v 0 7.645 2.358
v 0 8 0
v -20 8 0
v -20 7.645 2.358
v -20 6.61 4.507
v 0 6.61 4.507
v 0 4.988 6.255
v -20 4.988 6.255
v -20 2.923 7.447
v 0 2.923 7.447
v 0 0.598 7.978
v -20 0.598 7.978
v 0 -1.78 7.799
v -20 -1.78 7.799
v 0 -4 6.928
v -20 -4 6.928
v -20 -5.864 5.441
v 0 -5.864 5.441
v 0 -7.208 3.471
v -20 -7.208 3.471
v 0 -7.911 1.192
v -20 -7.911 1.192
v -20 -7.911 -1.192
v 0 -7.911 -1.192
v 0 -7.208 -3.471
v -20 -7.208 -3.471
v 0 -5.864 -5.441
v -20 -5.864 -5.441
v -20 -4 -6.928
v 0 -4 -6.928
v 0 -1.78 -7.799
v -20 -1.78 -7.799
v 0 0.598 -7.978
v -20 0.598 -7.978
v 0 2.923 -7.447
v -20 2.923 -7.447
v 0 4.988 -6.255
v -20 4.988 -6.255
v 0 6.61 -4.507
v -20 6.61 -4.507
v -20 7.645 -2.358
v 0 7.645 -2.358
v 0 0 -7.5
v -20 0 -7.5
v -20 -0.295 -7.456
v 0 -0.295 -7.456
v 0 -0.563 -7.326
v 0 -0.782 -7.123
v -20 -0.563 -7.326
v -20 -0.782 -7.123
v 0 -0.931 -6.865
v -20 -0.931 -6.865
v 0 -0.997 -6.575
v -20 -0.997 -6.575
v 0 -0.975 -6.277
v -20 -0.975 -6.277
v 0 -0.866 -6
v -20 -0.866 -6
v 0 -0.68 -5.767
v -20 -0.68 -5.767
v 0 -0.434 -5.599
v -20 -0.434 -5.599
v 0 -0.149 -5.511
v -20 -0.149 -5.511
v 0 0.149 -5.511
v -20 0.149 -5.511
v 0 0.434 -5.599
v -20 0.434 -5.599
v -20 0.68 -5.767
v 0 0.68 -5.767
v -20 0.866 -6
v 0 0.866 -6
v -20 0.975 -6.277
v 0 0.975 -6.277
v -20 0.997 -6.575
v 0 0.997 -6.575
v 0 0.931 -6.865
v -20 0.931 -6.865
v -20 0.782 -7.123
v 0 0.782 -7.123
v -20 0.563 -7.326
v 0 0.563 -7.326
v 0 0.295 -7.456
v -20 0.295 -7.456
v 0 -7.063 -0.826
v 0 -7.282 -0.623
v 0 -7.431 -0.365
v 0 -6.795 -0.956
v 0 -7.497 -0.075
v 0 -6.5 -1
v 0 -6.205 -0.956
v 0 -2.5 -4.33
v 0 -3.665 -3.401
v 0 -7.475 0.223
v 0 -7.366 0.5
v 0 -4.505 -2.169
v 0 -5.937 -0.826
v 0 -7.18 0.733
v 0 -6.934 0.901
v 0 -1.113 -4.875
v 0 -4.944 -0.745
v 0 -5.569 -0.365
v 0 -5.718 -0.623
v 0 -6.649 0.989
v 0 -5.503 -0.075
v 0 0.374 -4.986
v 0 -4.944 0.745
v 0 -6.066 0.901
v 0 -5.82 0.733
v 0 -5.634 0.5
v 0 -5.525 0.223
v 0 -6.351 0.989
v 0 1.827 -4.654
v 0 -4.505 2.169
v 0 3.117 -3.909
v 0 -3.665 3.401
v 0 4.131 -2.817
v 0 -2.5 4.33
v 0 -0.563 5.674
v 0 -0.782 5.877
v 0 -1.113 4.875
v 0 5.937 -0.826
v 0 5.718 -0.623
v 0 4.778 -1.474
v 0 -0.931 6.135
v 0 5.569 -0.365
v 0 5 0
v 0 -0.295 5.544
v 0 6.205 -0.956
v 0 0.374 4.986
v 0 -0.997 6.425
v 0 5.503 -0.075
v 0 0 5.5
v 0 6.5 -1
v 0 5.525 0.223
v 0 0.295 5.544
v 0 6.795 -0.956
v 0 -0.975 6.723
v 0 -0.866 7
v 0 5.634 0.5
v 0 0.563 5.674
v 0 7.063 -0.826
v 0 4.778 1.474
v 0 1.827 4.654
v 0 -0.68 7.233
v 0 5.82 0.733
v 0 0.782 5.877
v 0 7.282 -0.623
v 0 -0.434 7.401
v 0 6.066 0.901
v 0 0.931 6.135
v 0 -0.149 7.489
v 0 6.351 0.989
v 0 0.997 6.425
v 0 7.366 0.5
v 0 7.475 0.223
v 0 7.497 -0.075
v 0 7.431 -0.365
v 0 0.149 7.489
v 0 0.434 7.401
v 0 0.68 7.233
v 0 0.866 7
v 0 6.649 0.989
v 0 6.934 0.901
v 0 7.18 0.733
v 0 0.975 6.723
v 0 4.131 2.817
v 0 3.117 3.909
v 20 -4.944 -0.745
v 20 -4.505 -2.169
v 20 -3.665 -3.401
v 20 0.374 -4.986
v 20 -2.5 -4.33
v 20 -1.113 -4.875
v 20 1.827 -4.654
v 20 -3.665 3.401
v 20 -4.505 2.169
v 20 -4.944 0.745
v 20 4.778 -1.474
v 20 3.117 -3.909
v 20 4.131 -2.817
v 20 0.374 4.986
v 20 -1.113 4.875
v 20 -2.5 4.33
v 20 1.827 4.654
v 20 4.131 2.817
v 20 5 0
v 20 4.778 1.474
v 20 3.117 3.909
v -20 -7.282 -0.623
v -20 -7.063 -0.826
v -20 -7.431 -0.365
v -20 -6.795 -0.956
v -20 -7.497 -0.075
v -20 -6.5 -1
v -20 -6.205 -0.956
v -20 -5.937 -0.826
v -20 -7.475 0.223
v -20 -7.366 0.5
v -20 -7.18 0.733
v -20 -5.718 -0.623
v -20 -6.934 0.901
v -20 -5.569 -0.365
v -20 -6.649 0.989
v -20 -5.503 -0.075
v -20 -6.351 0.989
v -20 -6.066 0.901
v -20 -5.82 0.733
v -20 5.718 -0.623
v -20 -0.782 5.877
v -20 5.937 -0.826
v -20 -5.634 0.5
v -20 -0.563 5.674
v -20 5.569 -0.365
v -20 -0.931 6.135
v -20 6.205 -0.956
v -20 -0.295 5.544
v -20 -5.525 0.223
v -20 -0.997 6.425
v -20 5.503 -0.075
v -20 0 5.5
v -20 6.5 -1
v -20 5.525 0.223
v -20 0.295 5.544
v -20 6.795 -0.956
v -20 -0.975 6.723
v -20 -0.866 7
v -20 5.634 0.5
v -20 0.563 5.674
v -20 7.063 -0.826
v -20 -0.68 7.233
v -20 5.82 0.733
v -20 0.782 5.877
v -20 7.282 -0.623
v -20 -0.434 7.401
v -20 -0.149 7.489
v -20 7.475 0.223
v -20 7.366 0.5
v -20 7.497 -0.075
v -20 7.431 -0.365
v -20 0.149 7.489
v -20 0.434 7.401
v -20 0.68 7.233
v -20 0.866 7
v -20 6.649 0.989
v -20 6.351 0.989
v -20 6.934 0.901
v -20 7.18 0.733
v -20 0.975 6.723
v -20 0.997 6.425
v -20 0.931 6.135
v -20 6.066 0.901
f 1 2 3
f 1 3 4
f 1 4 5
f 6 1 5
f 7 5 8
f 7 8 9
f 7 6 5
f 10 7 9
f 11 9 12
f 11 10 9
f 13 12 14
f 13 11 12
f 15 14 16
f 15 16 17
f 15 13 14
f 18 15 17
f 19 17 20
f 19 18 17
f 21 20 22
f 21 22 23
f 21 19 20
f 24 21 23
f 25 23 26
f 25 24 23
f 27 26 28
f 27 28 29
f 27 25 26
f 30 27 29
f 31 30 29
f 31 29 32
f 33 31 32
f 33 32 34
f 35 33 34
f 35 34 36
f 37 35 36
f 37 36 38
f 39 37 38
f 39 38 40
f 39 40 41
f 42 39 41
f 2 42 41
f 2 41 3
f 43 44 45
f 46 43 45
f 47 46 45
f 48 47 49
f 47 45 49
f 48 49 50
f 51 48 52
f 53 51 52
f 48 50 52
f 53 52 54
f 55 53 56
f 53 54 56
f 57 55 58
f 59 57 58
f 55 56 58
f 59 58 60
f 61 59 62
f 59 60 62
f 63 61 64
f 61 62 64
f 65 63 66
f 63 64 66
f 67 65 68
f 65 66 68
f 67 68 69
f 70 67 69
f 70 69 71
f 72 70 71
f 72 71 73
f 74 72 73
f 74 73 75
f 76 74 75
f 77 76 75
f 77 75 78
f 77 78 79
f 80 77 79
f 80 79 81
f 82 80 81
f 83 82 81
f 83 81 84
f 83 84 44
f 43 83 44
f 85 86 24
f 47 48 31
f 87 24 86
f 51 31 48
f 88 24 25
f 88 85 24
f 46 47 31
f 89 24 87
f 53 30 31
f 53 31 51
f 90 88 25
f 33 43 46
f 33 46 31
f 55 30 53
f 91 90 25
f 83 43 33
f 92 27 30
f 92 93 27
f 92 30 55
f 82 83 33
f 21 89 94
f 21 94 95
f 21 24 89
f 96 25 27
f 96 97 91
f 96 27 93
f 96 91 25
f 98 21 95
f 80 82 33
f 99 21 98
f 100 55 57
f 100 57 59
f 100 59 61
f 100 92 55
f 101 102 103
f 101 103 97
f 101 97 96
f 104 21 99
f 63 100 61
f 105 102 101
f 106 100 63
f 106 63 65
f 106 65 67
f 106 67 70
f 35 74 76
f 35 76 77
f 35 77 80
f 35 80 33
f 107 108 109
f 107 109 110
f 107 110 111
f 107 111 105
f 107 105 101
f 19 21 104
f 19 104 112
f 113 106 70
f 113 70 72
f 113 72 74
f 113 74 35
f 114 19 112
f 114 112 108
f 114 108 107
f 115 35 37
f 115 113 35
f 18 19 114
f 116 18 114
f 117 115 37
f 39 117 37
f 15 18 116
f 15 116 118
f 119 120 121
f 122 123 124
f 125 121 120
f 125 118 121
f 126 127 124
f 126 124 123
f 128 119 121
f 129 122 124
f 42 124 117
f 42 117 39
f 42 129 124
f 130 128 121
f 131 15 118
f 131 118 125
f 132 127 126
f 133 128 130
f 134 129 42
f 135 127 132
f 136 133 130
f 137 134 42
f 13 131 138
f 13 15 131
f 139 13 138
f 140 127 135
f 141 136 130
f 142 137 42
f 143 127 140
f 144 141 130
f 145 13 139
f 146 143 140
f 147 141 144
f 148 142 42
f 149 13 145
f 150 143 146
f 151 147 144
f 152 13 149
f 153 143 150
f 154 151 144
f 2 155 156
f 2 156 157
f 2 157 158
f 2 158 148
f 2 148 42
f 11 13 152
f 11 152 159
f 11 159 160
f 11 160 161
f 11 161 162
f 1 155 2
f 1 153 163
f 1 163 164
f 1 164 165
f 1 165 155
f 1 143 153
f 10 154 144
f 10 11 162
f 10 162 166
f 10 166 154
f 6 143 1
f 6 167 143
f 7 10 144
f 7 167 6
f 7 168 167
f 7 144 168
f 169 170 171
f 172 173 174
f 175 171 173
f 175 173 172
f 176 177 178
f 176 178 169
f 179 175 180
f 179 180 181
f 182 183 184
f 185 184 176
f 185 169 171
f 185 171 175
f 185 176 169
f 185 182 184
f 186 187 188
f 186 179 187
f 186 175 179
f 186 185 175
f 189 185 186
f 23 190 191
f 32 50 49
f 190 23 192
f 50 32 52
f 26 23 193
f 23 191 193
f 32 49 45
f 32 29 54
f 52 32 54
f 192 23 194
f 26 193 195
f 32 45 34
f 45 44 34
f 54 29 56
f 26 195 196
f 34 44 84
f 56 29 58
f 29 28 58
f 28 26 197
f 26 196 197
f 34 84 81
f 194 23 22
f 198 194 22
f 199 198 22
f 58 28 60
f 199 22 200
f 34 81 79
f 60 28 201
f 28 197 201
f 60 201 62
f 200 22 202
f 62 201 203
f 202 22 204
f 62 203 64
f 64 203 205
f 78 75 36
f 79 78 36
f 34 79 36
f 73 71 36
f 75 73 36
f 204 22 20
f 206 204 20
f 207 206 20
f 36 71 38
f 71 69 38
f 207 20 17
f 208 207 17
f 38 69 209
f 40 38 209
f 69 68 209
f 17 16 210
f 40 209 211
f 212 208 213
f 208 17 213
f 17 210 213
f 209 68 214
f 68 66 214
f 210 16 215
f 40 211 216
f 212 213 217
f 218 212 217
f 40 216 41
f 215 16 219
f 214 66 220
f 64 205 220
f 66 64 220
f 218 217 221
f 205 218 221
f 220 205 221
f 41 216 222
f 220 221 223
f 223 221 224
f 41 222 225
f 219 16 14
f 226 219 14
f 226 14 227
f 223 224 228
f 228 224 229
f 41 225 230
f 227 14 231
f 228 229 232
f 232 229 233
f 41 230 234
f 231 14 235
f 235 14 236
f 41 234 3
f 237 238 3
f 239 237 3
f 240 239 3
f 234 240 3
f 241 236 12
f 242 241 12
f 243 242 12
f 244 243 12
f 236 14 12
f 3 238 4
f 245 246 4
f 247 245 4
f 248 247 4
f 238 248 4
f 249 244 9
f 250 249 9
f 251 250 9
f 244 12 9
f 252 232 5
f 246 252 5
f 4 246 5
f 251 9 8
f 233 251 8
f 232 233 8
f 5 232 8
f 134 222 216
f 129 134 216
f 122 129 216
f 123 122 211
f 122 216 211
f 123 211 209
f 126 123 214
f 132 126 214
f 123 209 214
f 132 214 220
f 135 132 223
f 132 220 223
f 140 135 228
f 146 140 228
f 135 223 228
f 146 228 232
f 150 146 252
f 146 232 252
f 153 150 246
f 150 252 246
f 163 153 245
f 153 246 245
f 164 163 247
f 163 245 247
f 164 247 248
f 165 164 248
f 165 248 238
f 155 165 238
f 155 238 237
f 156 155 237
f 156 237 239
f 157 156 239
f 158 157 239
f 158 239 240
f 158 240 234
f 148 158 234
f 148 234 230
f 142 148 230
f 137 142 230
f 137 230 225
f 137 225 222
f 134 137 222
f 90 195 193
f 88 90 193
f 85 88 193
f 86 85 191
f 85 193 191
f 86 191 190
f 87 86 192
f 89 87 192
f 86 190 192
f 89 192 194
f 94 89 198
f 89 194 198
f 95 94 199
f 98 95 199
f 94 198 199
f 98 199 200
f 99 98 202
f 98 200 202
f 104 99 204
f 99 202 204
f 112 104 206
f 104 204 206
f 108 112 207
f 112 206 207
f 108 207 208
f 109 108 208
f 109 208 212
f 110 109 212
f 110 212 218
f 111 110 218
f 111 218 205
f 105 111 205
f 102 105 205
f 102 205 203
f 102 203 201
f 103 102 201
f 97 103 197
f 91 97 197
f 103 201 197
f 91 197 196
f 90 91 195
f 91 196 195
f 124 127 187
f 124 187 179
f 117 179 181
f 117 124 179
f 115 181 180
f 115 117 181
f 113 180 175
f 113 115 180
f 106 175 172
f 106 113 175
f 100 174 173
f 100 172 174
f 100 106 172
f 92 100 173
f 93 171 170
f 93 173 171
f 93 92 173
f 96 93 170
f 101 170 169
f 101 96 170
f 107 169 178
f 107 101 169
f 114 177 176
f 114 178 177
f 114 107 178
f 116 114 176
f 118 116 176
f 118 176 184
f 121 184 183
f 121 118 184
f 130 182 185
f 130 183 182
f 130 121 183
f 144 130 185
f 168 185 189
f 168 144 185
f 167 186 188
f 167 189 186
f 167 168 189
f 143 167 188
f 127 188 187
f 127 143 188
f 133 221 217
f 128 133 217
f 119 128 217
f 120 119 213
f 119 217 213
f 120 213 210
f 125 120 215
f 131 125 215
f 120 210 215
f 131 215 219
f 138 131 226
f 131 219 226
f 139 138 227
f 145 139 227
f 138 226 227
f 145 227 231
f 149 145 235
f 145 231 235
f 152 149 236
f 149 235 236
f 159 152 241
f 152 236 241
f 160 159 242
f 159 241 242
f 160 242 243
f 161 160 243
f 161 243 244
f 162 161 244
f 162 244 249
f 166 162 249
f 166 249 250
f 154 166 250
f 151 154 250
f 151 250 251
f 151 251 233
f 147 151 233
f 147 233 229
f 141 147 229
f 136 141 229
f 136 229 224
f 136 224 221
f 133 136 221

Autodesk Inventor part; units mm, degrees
ref_plane "YZ Plane" through (0, 0, 0) normal (1, 0, 0) x (0, 1, 0)
ref_plane "XZ Plane" through (0, 0, 0) normal (0, 1, 0) x (-1, 0, 0)
ref_plane "XY Plane" through (0, 0, 0) normal (0, 0, 1) x (1, 0, 0)
sketch "Sketch1" plane through (0, 0, 0) normal (1, 0, 0) x (0, 1, 0)
  circle A0 centre (0, 0) radius 8
  circle A1 centre (0, 0) radius 5
  circle A2 centre (0, 0) radius 6.5
  point P0 (6.5, 0)
  point P1 (0, 6.5)
  point P2 (-6.5, 0)
  point P3 (0, -6.5)
  dimension "d0" = 16
  dimension "d5" = 13
extrude "Extrusion1" add sketch "Sketch1" against normal blind 20 contours A0 | A1 | A2
extrude "Extrusion2" add sketch "Sketch1" along normal blind 20 contours A1
hole "Hole1" at (0, 6.5, 0) at (0, 0, 6.5) at (0, -6.5, 0) at (0, 0, -6.5) direction (-1, 0, 0) diameter 2 end through all
properties part number "suspension2chassiscylindricalshaft"
